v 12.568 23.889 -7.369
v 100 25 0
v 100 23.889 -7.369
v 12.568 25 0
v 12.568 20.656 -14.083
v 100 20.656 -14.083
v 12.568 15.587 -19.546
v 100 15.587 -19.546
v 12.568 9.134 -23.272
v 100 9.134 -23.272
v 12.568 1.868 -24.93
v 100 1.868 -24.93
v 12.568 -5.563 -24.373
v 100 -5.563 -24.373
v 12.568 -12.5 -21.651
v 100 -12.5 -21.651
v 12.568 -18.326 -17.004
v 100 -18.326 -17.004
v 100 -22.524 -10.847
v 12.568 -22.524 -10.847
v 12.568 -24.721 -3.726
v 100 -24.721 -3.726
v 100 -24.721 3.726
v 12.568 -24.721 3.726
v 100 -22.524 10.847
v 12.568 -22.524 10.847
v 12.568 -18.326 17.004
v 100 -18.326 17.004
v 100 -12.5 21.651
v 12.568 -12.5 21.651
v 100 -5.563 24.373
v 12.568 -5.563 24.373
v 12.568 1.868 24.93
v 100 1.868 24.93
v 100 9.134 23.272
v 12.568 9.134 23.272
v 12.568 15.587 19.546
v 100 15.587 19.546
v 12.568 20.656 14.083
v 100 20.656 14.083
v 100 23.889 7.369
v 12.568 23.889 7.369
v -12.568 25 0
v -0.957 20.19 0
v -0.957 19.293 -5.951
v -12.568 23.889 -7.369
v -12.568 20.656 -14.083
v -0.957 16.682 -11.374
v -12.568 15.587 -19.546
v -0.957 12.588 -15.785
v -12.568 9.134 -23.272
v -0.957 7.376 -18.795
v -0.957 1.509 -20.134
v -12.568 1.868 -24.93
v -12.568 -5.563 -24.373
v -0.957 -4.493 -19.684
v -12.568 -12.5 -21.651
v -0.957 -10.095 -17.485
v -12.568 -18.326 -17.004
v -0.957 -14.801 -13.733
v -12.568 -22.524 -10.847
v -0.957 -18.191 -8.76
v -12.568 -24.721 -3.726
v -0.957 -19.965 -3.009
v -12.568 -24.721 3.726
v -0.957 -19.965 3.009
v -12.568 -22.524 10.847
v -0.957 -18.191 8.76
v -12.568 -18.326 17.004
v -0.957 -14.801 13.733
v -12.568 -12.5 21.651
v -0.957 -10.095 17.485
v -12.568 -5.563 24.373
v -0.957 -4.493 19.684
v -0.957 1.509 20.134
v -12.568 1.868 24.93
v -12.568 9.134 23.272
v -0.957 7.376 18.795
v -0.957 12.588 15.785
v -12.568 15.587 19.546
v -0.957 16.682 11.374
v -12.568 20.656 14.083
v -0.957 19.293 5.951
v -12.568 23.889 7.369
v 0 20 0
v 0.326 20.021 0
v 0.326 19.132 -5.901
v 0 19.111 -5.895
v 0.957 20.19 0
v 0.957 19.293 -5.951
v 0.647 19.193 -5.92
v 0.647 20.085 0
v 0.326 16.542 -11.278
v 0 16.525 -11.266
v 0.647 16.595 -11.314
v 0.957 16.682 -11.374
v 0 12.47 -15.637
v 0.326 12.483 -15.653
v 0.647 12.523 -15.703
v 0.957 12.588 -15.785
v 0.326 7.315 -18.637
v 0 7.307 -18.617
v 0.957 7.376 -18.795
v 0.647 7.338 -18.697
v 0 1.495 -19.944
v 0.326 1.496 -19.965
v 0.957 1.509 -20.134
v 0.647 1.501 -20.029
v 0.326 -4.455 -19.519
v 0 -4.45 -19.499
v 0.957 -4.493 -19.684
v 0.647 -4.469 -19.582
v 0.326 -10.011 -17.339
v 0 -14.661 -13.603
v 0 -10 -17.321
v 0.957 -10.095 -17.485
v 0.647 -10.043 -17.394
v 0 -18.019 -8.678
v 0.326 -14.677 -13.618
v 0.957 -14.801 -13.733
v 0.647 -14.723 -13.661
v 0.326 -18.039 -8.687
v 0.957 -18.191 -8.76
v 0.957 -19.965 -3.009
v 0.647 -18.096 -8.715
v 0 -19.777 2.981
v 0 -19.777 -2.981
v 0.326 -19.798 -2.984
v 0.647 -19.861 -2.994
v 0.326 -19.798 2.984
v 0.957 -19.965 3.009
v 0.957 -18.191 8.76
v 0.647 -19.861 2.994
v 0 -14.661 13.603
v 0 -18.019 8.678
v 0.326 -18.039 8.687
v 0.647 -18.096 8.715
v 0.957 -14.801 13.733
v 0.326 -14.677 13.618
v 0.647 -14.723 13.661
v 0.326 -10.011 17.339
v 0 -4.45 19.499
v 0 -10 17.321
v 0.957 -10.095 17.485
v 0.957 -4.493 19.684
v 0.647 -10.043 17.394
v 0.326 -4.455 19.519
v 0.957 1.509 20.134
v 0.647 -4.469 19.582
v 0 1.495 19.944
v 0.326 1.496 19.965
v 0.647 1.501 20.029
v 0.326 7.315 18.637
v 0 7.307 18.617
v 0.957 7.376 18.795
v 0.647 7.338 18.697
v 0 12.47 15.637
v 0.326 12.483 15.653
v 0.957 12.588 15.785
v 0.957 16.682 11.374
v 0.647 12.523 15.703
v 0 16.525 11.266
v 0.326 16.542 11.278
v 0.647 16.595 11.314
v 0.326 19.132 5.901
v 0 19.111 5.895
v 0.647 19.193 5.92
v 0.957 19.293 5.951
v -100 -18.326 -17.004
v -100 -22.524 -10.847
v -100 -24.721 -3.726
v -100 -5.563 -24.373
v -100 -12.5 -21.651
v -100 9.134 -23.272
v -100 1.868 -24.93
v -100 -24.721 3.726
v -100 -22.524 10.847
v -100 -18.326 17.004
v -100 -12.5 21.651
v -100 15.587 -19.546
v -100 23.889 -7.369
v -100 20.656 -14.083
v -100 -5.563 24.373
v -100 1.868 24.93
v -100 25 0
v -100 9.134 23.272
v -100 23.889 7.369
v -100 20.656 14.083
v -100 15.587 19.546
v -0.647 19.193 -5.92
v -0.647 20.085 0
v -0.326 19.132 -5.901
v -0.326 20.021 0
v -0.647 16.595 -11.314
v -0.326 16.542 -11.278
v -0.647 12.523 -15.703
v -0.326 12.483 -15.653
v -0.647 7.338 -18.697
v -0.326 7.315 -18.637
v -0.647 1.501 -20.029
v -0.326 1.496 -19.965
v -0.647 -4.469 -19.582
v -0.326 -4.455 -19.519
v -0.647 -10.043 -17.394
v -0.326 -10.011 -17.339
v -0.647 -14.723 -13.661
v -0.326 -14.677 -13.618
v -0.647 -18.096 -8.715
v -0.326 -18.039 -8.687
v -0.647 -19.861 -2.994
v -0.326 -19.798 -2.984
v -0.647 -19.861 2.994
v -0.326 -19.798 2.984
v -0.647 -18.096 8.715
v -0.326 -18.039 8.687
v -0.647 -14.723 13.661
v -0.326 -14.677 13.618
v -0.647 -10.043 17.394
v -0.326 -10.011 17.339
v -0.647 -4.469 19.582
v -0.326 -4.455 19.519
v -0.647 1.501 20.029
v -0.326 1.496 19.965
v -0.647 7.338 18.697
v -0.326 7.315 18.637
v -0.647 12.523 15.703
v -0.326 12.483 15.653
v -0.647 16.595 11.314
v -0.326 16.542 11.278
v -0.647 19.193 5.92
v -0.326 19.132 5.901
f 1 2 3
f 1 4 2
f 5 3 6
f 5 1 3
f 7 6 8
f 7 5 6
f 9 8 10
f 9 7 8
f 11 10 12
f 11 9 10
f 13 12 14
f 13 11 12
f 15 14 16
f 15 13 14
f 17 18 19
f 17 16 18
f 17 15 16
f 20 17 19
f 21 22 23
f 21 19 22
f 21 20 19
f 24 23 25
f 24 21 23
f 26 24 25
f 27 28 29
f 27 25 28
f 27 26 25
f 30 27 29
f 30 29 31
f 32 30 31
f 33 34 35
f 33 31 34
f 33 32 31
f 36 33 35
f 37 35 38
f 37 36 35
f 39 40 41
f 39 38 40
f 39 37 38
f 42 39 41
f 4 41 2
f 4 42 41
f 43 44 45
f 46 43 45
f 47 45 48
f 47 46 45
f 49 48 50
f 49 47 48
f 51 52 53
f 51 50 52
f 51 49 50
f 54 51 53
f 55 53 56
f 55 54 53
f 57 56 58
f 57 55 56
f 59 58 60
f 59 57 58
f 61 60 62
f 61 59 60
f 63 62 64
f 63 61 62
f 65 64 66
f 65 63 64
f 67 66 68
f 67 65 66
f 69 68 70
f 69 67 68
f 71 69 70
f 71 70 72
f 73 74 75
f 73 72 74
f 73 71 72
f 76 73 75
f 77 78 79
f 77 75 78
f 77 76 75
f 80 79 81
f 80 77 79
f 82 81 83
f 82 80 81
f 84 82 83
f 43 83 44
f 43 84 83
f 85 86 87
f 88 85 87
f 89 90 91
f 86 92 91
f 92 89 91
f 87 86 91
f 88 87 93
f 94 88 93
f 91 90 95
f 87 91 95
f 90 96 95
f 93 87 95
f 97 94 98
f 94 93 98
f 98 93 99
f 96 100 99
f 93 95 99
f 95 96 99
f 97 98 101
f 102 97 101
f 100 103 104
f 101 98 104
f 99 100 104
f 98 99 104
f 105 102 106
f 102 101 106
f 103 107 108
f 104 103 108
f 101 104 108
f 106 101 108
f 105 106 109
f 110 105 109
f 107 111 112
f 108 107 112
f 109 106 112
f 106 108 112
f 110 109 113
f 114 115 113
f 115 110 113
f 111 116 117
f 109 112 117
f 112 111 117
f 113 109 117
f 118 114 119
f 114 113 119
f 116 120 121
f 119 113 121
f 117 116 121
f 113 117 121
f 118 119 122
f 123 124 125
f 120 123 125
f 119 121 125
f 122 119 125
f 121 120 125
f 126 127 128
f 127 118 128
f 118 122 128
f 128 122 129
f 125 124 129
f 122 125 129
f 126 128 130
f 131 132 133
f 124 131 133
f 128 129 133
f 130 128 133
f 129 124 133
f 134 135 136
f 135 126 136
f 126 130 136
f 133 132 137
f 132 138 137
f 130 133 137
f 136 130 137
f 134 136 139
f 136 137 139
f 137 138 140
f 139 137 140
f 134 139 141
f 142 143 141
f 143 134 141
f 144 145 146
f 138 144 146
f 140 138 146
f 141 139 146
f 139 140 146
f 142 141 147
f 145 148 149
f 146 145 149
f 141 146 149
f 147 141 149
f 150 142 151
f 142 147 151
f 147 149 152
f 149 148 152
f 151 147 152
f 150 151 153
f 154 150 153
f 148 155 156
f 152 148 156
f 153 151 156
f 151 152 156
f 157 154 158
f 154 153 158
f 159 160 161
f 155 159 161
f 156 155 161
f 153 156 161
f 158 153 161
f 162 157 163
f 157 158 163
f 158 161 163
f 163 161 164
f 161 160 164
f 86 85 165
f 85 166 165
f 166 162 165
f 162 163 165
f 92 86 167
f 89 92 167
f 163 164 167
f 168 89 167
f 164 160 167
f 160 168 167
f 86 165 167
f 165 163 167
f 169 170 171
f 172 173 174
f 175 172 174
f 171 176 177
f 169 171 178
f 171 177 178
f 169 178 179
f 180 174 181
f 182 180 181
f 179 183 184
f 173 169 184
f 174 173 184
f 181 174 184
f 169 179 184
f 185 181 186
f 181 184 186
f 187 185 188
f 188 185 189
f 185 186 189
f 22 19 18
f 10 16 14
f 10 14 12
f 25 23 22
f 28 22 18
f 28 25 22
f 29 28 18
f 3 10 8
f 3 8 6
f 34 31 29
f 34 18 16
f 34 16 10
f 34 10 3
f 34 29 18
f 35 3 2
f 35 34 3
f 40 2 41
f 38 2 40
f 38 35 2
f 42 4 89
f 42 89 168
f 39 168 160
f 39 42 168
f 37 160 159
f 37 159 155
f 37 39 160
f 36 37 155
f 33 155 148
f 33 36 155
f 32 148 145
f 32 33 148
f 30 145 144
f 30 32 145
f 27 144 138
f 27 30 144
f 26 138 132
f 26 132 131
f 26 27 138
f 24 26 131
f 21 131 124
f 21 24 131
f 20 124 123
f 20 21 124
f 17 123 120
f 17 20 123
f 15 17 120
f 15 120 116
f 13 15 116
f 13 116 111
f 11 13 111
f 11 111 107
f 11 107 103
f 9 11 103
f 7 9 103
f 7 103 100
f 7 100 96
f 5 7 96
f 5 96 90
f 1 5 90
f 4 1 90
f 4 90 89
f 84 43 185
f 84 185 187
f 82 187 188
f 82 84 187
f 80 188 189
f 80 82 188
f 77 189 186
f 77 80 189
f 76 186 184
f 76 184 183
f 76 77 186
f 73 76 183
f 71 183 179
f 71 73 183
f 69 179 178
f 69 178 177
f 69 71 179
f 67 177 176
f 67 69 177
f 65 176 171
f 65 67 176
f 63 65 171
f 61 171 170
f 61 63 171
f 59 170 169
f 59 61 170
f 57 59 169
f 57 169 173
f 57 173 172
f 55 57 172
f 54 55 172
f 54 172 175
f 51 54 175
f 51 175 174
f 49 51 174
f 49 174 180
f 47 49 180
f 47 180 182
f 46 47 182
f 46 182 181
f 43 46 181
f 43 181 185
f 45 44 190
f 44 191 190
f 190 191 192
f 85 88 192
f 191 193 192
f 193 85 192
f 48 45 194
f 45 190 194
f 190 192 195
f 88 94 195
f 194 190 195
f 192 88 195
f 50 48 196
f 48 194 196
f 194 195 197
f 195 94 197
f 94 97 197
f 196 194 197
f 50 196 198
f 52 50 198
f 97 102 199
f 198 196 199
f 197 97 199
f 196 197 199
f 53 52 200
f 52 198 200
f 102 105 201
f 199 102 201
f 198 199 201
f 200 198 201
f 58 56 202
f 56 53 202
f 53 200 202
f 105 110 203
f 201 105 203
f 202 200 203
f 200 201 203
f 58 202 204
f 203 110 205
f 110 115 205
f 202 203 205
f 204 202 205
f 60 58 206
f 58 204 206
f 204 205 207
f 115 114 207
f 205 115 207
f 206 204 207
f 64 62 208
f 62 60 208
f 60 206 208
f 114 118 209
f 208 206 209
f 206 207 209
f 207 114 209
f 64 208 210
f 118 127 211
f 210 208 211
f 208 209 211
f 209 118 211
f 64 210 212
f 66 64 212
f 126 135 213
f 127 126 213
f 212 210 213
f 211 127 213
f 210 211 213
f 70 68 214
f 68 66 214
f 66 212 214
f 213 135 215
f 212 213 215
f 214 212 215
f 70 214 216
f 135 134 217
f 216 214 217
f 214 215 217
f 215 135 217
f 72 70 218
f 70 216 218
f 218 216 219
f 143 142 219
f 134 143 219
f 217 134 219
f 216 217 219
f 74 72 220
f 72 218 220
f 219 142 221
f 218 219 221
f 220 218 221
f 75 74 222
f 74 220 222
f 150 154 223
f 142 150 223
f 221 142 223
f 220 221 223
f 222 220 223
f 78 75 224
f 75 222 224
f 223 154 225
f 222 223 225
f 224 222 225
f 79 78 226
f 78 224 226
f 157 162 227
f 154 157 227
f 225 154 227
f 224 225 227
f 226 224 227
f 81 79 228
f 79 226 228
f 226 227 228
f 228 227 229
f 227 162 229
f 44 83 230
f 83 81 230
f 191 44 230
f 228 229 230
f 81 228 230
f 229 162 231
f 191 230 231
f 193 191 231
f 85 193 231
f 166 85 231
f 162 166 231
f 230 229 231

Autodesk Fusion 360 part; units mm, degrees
sketch "Sketch1" plane through (0, 0, 0) normal (0, 0, 1) x (1, 0, 0)
  line L0 (100, 0) -> (100, 25)
  line L1 (100, 25) -> (12.5683, 25)
  line L2 (12.5683, 25) -> (0.9567, 20.1903)
  arc A0 (0, 20) -> (0.9567, 20.1903) centre (0, 22.5) ccw
  line L3 (0, 0) -> (100, 0) construction
  line L4 (0, 0) -> (0, 20) construction
  line L5 (100, 20) -> (0, 20) construction
  line L6 (100, 0) -> (100, -25) construction
  line L7 (100, -25) -> (12.5683, -25) construction
  line L8 (12.5683, -25) -> (0.9567, -20.1903) construction
  arc A1 (0.9567, -20.1903) -> (0, -20) centre (0, -22.5) ccw construction
  arc A2 (-0.9567, 20.1903) -> (0, 20) centre (0, 22.5) ccw
  line L9 (-12.5683, 25) -> (-0.9567, 20.1903)
  line L10 (-100, 25) -> (-12.5683, 25)
  line L11 (-100, 0) -> (-100, 25)
  line L12 (-100, 0) -> (-100, -25) construction
  line L13 (-100, -25) -> (-12.5683, -25) construction
  line L14 (-12.5683, -25) -> (-0.9567, -20.1903) construction
  arc A3 (0, -20) -> (-0.9567, -20.1903) centre (0, -22.5) ccw construction
  line L15 (-100, 0) -> (100, 0)
  dimension "Notch_Radius" = 2.5
  dimension "Notch_Height" = 5
  dimension "Bar_Diameter" = 50
  dimension "Bar_Length" = 200
  dimension "Notch_Theta" = 135
revolve "Revolve1" add sketch "Sketch1" angle 360 about axis through (-100, 0, 0) along (1, 0, 0)
